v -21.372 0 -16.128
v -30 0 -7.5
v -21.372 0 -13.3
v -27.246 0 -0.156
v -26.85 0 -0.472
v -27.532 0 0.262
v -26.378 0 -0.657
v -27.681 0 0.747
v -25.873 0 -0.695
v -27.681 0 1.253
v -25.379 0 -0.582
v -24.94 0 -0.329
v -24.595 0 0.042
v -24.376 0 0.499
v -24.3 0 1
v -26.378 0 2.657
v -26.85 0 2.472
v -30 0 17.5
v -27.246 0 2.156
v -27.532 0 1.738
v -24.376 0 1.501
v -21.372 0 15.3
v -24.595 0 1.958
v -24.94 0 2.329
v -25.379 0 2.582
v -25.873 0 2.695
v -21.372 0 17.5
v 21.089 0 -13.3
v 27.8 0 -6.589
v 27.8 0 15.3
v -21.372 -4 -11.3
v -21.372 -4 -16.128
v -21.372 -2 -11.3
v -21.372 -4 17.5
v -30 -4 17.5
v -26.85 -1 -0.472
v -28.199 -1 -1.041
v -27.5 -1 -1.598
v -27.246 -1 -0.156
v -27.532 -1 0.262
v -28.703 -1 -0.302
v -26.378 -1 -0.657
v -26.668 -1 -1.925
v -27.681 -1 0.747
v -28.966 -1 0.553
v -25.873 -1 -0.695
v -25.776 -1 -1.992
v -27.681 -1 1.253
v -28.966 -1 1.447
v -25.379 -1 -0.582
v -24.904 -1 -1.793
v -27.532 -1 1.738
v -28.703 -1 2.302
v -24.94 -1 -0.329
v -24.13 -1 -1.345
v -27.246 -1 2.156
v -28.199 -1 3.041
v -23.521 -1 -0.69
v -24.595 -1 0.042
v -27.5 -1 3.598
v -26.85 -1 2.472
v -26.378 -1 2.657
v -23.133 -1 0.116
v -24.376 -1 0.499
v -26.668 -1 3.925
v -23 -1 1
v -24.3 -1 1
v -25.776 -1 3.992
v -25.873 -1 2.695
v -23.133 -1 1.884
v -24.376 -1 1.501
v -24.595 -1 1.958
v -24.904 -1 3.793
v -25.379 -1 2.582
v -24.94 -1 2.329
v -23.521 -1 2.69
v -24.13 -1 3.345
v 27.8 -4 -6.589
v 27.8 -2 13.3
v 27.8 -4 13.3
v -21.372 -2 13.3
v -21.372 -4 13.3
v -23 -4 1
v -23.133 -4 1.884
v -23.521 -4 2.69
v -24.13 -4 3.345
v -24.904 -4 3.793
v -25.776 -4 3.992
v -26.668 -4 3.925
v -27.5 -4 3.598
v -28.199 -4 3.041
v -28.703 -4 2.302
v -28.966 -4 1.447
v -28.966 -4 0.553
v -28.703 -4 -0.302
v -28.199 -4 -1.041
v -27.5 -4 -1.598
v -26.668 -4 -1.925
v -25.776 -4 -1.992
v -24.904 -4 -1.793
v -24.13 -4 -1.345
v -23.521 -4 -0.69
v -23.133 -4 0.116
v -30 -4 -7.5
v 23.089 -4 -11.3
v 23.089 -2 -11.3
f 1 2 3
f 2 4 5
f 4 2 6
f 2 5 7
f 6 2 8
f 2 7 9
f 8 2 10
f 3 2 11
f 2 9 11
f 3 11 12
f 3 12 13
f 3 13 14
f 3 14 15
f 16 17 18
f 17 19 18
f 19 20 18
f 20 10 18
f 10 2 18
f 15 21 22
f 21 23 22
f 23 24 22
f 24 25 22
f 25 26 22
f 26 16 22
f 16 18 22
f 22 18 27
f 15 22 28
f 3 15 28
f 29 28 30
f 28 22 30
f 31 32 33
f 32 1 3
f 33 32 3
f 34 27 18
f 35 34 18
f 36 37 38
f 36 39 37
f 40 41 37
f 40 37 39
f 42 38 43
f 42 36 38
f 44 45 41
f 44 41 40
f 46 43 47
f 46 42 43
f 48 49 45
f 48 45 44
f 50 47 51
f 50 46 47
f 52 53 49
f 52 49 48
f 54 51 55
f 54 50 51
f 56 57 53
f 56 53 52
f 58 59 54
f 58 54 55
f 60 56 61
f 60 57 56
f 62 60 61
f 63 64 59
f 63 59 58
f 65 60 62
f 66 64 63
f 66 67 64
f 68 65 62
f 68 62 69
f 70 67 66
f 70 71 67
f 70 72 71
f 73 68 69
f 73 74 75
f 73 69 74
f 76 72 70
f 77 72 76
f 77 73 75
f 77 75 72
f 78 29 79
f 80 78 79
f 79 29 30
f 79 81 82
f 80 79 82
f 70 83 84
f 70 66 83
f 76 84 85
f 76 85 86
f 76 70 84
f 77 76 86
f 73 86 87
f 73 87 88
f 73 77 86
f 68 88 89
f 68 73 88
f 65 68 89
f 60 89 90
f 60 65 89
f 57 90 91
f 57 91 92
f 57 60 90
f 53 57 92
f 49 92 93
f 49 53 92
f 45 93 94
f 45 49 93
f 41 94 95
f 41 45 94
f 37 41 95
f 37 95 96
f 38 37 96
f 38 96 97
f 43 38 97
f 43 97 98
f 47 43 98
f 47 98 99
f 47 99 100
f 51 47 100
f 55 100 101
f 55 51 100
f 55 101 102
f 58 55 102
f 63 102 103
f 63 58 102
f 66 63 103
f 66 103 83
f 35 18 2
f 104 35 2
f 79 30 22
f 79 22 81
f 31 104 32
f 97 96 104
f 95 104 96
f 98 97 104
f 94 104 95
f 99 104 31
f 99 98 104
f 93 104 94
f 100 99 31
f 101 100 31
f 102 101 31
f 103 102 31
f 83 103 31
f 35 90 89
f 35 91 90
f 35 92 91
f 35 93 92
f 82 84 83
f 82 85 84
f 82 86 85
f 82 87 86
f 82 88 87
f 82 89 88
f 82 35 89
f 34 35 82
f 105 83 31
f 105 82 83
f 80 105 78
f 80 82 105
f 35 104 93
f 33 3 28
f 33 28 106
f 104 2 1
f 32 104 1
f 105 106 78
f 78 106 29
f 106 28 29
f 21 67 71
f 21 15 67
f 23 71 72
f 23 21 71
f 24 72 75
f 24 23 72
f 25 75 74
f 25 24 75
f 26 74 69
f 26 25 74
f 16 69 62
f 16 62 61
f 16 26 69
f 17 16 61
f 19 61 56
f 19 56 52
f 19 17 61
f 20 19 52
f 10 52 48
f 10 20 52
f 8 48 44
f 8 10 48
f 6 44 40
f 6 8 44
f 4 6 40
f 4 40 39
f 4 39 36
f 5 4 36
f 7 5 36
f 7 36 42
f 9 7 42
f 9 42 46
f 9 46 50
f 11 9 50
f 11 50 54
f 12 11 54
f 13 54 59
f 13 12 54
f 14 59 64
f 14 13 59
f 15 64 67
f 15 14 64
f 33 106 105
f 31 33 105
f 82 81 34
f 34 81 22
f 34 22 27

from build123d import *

# Parameters (mm, degrees)
PAD005_DEPTH    = 4
POCKET010_DEPTH = 49.172573
POCKET011_DEPTH = 49.172573


with BuildPart() as part:
    # Sketch016 → Pad005 (new body)
    with BuildSketch(Plane.XZ):
        Polygon((-21.371573, 17.5), (-30, 17.5), (-30, -7.5), (-21.371573, -16.128427), (-21.371573, -13.3), (21.08873, -13.3), (27.8, -6.58873), (27.8, 15.3), (-21.371573, 15.3), align=None)
    extrude(amount=PAD005_DEPTH)

    # Sketch017 (on DatumPlane) → Pocket010 (cut, through all)
    with BuildSketch(Plane(origin=(-21.371573, 0, 0), x_dir=(0, 0, -1), z_dir=(-1, 0, 0))):
        Polygon((13.3, 0), (11.3, 2), (11.3, 4), (13.3, 4), align=None)
    extrude(amount=-POCKET010_DEPTH, mode=Mode.SUBTRACT)

    # Sketch018 (on DatumPlane) → Pocket011 (cut, through all)
    with BuildSketch(Plane(origin=(-21.371573, 0, 0), x_dir=(0, 0, -1), z_dir=(-1, 0, 0))):
        Polygon((-15.3, 4), (-15.3, 0), (-13.3, 2), (-13.3, 4), align=None)
    extrude(amount=-POCKET011_DEPTH, mode=Mode.SUBTRACT)

    # Sketch020 (on DatumPlane) → Groove (revolve, cut)
    with BuildSketch(Plane(origin=(-26, -41, 1), x_dir=(1, 0, 0), z_dir=(0, 0, -1))):
        Polygon((0, -41), (0, -37), (3, -37), (3, -40), (1.7, -40), (1.7, -41), align=None)
    revolve(axis=Axis((-26, -41, 1), (0, -1, 0)), mode=Mode.SUBTRACT)


solid = part.part
